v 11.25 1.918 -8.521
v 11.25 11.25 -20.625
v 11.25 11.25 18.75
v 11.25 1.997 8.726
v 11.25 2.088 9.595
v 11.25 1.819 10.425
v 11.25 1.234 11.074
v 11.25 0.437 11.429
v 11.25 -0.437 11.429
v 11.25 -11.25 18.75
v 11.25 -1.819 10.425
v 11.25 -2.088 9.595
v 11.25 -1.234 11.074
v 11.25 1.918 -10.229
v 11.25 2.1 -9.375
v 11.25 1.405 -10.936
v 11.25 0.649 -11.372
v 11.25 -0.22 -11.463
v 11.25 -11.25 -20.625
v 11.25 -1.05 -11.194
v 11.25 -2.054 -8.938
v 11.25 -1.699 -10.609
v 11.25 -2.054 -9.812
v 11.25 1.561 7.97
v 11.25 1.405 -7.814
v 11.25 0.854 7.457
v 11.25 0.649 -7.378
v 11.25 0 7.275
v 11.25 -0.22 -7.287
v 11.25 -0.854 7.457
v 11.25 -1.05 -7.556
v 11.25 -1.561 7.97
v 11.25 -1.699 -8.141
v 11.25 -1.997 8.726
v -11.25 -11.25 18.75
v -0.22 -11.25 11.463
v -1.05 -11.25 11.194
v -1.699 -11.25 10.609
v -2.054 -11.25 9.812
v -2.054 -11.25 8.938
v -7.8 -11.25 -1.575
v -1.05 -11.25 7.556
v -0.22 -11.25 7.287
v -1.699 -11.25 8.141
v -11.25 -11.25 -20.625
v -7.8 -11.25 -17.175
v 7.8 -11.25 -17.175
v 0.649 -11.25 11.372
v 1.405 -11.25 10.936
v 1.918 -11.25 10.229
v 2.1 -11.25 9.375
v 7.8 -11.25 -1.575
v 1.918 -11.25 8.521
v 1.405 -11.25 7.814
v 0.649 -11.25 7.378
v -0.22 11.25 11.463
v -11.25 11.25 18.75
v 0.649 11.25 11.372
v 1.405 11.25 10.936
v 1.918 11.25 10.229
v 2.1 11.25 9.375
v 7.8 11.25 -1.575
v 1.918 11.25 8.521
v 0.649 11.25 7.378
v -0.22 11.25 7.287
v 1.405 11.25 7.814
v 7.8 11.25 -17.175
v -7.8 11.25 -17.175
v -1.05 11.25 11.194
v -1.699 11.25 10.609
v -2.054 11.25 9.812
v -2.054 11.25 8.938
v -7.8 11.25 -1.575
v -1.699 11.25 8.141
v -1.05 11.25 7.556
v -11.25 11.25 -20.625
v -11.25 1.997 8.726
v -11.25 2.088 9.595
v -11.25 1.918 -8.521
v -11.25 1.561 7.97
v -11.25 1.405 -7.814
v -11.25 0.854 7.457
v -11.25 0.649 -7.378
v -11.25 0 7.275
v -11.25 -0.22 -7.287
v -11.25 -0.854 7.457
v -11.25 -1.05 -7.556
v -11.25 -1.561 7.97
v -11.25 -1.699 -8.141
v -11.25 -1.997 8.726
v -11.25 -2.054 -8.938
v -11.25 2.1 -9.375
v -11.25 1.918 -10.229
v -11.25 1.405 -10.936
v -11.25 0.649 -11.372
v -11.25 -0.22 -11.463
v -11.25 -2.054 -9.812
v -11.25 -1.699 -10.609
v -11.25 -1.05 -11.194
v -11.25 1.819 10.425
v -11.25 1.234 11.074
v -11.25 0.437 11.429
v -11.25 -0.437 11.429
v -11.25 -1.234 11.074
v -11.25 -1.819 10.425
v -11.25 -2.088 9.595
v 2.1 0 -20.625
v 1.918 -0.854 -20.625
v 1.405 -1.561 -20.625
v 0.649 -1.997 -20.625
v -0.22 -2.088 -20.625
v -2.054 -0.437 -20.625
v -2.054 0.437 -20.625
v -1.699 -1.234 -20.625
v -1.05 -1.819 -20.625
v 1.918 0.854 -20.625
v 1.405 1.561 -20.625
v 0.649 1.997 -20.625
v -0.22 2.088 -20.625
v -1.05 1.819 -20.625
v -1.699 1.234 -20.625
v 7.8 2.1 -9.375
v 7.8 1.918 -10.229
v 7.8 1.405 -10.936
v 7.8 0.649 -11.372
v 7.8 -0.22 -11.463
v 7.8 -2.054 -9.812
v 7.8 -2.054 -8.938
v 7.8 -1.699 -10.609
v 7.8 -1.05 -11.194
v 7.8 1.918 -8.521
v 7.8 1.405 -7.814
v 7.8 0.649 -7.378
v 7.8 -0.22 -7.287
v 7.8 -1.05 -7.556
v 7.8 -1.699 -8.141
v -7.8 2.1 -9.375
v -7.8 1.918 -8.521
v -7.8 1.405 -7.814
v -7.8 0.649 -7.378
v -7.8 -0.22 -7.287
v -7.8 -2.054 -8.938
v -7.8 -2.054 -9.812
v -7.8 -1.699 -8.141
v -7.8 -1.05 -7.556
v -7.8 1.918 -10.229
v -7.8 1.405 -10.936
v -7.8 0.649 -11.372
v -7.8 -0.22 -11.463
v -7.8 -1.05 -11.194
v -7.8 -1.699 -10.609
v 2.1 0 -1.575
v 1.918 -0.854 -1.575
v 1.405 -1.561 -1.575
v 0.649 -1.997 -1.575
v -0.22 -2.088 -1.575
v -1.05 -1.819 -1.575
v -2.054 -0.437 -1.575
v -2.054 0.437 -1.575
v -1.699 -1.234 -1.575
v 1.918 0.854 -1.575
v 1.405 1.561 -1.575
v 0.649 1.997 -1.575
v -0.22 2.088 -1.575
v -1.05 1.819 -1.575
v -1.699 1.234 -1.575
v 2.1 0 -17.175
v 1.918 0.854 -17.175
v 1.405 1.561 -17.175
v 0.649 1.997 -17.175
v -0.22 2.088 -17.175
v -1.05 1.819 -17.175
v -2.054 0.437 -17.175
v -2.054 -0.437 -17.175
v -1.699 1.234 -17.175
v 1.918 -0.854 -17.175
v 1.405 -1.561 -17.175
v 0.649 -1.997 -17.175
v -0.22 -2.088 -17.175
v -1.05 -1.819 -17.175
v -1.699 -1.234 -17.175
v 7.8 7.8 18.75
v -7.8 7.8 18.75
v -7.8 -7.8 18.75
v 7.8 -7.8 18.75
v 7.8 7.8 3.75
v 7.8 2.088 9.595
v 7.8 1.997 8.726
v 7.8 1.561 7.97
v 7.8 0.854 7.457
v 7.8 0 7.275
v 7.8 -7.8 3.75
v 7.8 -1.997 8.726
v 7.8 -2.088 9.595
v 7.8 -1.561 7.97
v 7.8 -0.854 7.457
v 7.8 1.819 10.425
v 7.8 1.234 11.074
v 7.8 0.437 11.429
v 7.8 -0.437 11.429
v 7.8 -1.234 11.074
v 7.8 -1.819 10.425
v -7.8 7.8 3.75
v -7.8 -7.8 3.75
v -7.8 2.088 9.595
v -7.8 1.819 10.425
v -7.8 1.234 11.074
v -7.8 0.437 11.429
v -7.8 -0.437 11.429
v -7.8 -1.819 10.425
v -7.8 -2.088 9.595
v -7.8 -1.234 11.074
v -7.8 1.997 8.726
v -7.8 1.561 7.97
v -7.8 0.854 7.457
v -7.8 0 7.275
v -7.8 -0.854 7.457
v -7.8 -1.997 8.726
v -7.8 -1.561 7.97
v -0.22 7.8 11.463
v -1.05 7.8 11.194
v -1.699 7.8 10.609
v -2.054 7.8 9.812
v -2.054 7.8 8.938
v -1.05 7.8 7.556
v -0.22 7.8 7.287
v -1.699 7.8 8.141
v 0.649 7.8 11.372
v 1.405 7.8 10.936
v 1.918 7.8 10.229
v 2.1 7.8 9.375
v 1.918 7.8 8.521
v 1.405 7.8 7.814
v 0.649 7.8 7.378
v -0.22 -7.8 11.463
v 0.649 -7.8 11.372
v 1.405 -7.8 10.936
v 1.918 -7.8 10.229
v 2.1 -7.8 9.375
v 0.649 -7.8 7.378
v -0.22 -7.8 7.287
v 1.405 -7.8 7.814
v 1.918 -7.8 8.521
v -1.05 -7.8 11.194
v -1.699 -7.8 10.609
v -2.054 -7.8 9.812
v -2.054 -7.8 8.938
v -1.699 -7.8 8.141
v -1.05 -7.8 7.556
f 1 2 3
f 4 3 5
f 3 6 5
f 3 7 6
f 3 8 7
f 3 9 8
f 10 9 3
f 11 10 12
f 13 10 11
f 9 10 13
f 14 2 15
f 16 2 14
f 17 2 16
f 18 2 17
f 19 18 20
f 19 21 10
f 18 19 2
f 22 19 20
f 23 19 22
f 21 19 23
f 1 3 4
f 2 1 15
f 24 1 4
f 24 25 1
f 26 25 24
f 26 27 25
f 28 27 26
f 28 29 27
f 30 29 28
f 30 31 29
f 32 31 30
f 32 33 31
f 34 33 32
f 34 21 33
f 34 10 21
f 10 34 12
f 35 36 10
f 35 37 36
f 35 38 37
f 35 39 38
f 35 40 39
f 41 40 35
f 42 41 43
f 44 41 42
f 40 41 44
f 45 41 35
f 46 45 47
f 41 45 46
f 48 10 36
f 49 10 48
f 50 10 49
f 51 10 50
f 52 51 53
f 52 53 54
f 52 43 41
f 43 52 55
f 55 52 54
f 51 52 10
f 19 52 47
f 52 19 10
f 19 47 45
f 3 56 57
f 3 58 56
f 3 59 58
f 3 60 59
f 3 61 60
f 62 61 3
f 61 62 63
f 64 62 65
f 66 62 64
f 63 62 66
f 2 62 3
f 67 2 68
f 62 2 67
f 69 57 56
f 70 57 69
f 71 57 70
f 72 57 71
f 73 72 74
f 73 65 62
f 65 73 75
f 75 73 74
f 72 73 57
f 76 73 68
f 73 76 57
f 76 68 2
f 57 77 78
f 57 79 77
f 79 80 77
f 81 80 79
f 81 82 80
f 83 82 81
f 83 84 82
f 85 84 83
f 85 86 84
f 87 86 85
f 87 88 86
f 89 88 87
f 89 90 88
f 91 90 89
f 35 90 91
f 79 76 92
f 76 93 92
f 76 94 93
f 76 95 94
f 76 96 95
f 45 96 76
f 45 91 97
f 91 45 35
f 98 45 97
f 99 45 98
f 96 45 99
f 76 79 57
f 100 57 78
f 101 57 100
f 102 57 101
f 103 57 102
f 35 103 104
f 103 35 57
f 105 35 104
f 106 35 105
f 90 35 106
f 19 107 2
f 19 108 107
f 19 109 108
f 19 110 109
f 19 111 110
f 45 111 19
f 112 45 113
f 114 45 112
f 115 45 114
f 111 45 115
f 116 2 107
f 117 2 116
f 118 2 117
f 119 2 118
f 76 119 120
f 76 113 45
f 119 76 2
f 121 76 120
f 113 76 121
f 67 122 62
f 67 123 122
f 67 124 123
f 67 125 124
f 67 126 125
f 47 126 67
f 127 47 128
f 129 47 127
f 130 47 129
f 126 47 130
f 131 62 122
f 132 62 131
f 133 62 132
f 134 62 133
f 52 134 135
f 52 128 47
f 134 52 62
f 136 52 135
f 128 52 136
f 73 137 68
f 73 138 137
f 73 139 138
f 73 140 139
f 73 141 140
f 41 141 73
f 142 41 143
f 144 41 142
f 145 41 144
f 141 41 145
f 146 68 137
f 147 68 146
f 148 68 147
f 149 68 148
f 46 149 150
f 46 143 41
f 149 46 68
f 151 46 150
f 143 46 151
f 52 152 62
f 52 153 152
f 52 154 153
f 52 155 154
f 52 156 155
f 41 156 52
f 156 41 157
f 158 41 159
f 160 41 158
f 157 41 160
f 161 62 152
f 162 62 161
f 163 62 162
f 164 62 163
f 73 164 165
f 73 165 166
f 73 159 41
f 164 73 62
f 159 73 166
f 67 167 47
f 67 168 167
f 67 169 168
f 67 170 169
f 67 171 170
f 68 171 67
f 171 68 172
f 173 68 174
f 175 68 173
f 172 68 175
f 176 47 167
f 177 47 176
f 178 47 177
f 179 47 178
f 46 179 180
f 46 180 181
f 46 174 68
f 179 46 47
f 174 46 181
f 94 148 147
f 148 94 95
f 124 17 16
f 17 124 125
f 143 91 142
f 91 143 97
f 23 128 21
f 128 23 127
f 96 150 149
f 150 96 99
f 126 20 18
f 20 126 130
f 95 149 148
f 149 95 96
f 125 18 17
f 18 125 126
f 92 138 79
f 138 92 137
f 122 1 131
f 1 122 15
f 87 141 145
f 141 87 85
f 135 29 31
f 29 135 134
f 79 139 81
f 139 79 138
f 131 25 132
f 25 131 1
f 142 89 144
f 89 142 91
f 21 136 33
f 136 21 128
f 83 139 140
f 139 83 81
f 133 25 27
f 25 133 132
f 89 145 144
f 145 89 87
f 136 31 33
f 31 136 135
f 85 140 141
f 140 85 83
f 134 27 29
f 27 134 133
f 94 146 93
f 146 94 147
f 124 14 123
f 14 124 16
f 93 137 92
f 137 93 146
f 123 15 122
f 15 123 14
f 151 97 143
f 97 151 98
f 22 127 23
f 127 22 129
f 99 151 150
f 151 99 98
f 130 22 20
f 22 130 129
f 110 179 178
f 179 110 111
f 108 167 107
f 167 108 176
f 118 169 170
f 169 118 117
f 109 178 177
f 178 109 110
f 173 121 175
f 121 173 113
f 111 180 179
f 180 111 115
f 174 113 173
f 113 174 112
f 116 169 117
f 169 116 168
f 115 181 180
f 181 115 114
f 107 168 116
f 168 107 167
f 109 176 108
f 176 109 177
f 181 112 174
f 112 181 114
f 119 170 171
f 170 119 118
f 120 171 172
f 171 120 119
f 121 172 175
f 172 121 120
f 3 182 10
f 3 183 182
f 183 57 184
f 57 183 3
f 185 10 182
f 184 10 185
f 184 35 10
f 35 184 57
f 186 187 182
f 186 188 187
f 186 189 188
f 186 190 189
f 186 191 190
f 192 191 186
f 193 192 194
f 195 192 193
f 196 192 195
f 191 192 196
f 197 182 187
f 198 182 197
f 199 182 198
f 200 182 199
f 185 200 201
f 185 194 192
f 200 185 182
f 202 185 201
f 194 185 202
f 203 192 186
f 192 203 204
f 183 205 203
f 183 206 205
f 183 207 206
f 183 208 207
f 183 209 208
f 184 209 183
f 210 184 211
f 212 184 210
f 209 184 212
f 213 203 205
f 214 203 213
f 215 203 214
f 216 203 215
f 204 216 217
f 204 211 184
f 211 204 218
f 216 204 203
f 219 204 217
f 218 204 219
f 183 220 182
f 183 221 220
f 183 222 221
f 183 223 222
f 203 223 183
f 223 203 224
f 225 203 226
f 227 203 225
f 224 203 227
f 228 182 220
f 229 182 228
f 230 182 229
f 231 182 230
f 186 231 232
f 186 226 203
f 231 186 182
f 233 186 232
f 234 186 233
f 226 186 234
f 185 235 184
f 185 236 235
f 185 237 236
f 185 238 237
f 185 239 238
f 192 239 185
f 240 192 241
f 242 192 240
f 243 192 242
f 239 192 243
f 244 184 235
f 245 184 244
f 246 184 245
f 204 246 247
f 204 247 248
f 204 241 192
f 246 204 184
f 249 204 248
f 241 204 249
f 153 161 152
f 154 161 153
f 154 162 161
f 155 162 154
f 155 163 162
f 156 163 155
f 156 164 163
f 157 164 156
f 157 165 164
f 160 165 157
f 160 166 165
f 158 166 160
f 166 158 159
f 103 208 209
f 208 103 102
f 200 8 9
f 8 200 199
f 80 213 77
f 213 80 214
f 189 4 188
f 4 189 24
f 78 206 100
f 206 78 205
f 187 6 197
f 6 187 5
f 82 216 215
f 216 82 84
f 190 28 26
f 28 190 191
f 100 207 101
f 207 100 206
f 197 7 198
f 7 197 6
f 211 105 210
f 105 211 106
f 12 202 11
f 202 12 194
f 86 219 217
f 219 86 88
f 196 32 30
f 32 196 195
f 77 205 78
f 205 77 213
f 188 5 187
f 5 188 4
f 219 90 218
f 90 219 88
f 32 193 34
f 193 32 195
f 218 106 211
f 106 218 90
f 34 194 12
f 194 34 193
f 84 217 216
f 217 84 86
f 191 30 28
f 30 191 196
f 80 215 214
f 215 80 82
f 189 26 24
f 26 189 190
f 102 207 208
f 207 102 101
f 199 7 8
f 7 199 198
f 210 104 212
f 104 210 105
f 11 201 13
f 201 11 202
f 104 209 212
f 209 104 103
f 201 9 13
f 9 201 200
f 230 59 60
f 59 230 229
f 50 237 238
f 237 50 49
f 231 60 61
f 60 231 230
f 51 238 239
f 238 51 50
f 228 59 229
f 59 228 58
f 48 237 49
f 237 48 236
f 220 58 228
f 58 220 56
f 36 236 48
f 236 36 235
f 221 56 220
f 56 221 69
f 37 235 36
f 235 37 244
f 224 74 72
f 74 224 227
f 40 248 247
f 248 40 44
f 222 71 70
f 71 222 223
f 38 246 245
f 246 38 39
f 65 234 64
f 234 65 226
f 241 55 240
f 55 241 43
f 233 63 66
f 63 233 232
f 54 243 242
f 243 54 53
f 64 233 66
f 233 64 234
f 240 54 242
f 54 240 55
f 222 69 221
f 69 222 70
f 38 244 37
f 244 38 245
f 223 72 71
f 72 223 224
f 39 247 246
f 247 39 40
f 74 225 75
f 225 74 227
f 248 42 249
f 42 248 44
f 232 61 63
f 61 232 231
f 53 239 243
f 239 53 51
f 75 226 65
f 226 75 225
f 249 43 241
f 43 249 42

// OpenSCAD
open_beam = 15; //open beam dimensions (square)
r_corners = 3;
extrusion=0.3;

w_t_mod = 0.5;
beam_width = 15;
slot_depth = 15;
cross_b_length = beam_width+beam_width*w_t_mod ;
//variables for edge fillet
b = 13;
h = 20;
w = 90*0.5888888+r_corners;


//===========================================================================================
//===========================================================================================
module beam_cap(){
	difference(){
		difference(){
			translate([0, 0, beam_width/2])
			cube([beam_width+beam_width*w_t_mod, beam_width+beam_width*w_t_mod, slot_depth+beam_width*w_t_mod], center=true);
			translate([0, 0, (beam_width*w_t_mod+beam_width)/2])
			cube([beam_width+extrusion*2, beam_width+extrusion*2, slot_depth], center=true);

		}
			union(){
				translate([0, 0, -(slot_depth+beam_width*w_t_mod+beam_width)/4])
				rotate([90, 0, 0])
				cube([beam_width+extrusion*2, beam_width+extrusion*2, cross_b_length*2], center=true);
				translate([0, 0, -(slot_depth+beam_width*w_t_mod+beam_width)/4])
				rotate([0, 90, 0])
				cylinder(r=1.5+extrusion*2, h=cross_b_length*2,center = true,  $fn=15);
				translate([0, 0, (slot_depth+beam_width*w_t_mod+beam_width)/4])
				rotate([0, 90, 0])
				cylinder(r=1.5+extrusion*2, h=cross_b_length*2,center = true,  $fn=15);
				translate([0, 0, (slot_depth+beam_width*w_t_mod+beam_width)/4])
				rotate([90, 0, 0])
				cylinder(r=1.5+extrusion*2, h=cross_b_length*2,center = true,  $fn=15);
			}
	}	
}

module cross_beam(){
	difference(){
	difference(){
		cube([beam_width+beam_width*w_t_mod, beam_width+beam_width*w_t_mod, cross_b_length], center=true);
		cube([beam_width+extrusion*2, beam_width+extrusion*2, cross_b_length], center=true);

	}
	rotate([0, 90, 0])
	cylinder(r=1.5+extrusion*2, h=cross_b_length*2,center = true,  $fn=15);
	rotate([90, 0, 0])
	cylinder(r=1.5+extrusion*2, h=cross_b_length*2,center = true,  $fn=15);
	}

}
//cross_beam();

union(){
translate([0, 0, -(slot_depth+beam_width*w_t_mod+beam_width)/4])
rotate([90, 0, 0])
cross_beam();
beam_cap();
}
